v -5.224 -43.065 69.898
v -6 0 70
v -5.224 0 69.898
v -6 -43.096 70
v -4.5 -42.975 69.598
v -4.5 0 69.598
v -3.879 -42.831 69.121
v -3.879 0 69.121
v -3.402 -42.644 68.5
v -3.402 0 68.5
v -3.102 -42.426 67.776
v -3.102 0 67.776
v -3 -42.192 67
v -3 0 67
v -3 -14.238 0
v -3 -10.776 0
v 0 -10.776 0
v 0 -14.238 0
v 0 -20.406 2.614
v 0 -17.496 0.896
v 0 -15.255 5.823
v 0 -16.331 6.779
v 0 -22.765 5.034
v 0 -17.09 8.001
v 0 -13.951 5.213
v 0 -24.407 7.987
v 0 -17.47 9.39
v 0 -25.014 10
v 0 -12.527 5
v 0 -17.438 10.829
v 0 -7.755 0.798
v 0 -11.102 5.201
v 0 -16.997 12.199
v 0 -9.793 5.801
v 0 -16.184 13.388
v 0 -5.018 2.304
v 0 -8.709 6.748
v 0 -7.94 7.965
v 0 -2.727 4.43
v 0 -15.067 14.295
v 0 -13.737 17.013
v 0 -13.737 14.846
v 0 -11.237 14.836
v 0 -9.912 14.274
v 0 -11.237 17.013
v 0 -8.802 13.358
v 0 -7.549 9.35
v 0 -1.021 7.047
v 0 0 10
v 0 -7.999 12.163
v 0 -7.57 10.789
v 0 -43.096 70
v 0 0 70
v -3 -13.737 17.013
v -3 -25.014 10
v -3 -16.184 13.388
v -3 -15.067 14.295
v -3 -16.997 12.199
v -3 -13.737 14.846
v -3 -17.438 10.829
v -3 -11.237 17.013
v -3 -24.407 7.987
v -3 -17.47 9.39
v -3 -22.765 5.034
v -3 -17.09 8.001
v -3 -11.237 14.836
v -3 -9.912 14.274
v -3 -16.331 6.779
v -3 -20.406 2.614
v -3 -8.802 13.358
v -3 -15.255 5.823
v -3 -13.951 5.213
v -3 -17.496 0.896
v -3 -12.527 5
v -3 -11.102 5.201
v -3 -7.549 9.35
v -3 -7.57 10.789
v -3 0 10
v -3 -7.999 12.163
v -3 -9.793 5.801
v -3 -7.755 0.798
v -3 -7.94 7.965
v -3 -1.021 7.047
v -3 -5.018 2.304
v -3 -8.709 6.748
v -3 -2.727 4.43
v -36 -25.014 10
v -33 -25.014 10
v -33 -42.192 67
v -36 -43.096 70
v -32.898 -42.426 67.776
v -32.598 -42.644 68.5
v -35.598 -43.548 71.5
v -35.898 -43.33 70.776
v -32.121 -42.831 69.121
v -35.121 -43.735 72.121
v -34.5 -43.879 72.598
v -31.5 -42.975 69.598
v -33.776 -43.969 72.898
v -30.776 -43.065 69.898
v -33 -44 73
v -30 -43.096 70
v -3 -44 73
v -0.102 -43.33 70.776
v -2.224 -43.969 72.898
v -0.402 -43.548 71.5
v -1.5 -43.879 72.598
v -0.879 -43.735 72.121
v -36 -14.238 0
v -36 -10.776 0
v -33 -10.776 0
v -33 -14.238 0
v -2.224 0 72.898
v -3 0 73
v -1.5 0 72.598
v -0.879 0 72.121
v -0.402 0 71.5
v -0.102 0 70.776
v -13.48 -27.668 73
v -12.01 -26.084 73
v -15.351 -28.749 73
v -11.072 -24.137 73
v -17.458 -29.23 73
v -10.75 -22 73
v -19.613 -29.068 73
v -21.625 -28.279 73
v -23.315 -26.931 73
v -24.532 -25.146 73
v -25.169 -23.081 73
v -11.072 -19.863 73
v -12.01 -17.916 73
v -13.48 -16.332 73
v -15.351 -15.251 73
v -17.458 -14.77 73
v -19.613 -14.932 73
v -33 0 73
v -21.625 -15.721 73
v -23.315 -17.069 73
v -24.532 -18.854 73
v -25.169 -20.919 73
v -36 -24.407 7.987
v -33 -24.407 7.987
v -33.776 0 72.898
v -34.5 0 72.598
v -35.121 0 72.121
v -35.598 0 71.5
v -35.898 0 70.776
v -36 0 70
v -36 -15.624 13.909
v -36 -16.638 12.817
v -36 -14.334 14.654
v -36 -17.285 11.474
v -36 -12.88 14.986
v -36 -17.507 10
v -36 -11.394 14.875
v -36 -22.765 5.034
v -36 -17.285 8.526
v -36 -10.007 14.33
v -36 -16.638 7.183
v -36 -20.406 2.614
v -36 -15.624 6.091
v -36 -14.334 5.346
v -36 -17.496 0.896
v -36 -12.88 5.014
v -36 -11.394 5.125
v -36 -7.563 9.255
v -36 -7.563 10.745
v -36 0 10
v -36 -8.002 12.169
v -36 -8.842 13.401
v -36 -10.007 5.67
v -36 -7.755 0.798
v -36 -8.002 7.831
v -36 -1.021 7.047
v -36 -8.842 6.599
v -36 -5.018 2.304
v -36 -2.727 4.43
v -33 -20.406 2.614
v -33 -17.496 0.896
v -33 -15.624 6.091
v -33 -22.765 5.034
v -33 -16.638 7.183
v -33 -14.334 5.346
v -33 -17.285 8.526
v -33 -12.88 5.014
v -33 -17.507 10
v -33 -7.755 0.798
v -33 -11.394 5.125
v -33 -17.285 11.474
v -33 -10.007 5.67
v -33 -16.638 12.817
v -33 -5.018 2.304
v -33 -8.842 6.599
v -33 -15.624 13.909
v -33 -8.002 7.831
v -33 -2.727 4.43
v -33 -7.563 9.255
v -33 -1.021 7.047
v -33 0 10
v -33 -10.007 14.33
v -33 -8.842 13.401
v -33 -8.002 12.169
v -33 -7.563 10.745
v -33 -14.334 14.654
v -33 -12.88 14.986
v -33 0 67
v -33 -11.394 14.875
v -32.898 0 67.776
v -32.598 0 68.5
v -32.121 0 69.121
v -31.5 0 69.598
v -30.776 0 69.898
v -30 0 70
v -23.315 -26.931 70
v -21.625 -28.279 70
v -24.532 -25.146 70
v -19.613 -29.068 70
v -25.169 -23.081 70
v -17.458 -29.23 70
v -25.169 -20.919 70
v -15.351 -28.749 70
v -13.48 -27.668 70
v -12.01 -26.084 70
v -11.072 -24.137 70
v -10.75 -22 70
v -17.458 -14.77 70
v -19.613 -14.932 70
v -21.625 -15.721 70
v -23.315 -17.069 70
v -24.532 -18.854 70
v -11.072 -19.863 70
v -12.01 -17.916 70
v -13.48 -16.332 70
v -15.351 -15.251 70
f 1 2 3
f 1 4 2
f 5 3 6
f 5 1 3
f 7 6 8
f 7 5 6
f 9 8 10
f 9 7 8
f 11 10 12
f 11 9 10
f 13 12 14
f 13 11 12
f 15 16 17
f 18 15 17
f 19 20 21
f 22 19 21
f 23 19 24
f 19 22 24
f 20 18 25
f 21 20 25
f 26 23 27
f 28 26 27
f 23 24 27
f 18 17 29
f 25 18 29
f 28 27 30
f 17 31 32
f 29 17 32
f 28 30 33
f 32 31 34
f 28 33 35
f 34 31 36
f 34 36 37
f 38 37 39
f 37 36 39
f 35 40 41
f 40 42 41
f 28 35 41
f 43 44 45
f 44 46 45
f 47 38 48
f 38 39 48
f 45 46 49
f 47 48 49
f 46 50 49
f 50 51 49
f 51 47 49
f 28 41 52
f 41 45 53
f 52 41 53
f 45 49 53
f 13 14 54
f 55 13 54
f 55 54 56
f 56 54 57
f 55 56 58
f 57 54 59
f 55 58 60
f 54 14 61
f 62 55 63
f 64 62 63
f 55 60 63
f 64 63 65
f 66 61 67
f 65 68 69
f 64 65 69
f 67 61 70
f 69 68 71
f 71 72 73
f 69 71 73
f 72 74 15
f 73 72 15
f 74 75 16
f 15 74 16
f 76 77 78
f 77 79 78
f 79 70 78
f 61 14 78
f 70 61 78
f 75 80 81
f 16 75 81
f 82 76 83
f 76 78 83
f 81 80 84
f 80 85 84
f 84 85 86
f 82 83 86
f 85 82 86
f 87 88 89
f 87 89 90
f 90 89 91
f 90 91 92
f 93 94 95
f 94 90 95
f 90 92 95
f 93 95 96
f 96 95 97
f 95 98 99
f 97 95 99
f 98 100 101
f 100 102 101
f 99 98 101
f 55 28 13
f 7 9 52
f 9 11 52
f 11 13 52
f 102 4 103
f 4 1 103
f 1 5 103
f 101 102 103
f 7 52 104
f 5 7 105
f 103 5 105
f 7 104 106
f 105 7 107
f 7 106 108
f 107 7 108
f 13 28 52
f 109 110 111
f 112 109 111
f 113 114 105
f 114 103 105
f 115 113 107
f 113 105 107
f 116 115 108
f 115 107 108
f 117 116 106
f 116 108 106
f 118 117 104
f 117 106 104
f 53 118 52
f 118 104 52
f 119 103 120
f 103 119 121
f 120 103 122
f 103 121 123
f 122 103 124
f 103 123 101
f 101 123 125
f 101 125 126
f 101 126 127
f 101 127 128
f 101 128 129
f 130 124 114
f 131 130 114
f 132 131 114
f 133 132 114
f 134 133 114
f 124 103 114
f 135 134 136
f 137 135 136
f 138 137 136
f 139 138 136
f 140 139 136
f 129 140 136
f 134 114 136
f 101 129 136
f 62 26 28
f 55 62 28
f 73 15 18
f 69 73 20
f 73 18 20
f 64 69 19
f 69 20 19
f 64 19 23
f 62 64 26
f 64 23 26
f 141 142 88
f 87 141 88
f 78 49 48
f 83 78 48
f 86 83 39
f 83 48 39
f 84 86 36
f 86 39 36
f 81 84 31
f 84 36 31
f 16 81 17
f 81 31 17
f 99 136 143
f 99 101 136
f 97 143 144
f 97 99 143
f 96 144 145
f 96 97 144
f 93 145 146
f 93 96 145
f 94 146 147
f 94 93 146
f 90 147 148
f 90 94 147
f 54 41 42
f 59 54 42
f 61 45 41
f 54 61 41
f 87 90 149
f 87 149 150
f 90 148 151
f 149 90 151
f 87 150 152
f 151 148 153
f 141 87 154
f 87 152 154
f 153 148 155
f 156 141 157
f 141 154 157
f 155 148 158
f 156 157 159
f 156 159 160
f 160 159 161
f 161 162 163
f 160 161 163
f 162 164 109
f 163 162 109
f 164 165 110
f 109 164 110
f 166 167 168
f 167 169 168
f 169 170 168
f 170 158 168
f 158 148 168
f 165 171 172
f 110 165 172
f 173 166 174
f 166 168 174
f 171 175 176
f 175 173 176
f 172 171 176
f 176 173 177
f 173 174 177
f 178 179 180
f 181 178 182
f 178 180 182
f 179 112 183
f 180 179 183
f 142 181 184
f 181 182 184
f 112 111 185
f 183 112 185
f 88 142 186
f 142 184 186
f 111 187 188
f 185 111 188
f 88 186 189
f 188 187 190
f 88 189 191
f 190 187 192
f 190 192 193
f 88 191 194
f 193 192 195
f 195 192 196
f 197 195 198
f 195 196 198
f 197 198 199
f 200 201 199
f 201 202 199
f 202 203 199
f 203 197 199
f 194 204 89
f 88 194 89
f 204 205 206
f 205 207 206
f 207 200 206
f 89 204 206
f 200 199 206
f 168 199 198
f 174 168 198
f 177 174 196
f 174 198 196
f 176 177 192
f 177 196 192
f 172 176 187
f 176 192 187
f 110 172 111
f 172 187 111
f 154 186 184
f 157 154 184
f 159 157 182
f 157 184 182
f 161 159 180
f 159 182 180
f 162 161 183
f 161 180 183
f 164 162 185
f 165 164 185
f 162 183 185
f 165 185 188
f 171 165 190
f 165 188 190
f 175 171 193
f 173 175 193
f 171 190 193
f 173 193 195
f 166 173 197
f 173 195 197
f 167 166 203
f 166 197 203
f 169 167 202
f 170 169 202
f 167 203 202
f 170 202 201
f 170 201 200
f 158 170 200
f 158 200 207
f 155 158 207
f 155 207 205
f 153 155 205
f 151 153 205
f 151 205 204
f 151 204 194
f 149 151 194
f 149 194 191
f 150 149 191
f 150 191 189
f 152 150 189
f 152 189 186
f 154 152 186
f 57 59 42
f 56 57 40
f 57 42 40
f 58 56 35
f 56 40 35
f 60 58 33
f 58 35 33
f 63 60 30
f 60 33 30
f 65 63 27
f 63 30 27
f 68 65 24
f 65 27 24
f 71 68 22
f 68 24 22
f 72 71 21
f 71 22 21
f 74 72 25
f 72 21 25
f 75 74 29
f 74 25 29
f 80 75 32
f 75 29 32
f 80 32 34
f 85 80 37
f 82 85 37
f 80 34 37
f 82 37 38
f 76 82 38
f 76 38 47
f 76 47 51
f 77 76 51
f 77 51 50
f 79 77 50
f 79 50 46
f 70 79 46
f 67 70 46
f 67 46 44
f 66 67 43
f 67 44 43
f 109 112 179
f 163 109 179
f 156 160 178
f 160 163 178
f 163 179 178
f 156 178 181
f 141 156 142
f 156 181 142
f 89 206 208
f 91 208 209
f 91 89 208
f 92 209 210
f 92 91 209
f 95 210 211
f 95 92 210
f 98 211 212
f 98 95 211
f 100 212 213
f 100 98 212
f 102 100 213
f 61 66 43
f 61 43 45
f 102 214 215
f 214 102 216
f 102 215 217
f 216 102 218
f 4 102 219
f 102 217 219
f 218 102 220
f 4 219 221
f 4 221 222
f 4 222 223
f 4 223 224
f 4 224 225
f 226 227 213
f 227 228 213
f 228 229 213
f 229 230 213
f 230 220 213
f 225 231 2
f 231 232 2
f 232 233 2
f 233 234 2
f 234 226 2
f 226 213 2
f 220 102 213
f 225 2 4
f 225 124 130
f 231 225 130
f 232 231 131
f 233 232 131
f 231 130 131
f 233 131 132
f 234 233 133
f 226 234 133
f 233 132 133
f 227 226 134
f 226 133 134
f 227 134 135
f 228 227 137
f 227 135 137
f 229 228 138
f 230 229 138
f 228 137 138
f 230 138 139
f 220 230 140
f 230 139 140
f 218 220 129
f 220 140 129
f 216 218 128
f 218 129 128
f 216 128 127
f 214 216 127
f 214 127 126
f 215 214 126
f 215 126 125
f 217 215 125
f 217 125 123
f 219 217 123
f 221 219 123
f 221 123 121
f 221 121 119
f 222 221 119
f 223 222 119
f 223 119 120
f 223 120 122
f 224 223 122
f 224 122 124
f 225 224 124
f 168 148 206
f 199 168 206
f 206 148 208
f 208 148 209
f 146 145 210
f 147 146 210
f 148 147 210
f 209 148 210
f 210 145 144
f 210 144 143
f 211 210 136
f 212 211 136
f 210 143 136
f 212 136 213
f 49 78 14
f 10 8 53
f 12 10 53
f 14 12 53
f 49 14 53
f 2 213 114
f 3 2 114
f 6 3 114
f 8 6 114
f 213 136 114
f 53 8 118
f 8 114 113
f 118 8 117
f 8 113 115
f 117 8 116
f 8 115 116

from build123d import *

# Parameters (mm, degrees)
F1_DEPTH  = 44
F3_DEPTH  = 55.2
F5_DEPTH  = 63.6
F7_DEPTH  = 49.8
F9_DEPTH  = 25
F10_R     = 7.25
F11_DEPTH = 25
F12_R     = 3
F13_R     = 3
F14_R     = 3
F15_R     = 3


with BuildPart() as f1:
    # F0 (on Front) → F1 (new body)
    with BuildSketch(Plane.XZ):
        Polygon((-36, 0), (-33, 0), (-33, 70), (-3, 70), (-3, 0), (0, 0), (0, 73), (-36, 73), align=None)
    extrude(amount=F1_DEPTH)

    # F2 (on face) → F3 (cut)
    with BuildSketch(Plane.YZ):
        Polygon((-44, 73), (-44, 10), (-25.0136986301, 10), align=None)
        Polygon((-25.0136986301, 10), (-44, 10), (-44, 0), (-22, 0), align=None)
    extrude(amount=-F3_DEPTH, mode=Mode.SUBTRACT)

    # F4 (on face) → F5 (cut)
    with BuildSketch(Plane.YZ):
        with BuildLine():
            Line((-24.407023006, 7.9869399744), (-25.0136986301, 10))
            ThreePointArc((-25.0136986301, 10), (-24.7517991178, 8.9809817325), (-24.407023006, 7.9869399744))
        make_face()
        with BuildLine():
            Line((-22, 0), (-14.237880293, 0))
            ThreePointArc((-14.237880293, 0), (-20.4062314251, 2.6135784089), (-24.407023006, 7.9869399744))
            Line((-24.407023006, 7.9869399744), (-22, 0))
        make_face()
        with BuildLine():
            Line((0, 0), (0, 10))
            ThreePointArc((0, 10), (-3.807463773, 3.2969407526), (-10.7758183371, 0))
            Line((-10.7758183371, 0), (0, 0))
        make_face()
    extrude(amount=-F5_DEPTH, mode=Mode.SUBTRACT)

    # F4 (on face) + F6 (on face) → F7 (cut)
    with BuildSketch(Plane.YZ):
        with BuildLine():
            Line((-17.5068493151, 10), (-7.5068493151, 10))
            ThreePointArc((-7.5068493151, 10), (-12.5068493151, 15), (-17.5068493151, 10))
        make_face()
    with BuildSketch(Plane.YZ):
        with BuildLine():
            Line((-7.5068493151, 10), (-17.5068493151, 10))
            ThreePointArc((-17.5068493151, 10), (-12.5068493151, 5), (-7.5068493151, 10))
        make_face()
    extrude(amount=-F7_DEPTH, mode=Mode.SUBTRACT)

    # F8 (on face) → F9 (cut)
    with BuildSketch(Plane.YZ):
        with BuildLine():
            Line((-11.2372876331, 17.0134898722), (-13.7372876331, 17.0134898722))
            Line((-13.7372876331, 17.0134898722), (-13.7372876331, 14.8462378755))
            ThreePointArc((-13.7372876331, 14.8462378755), (-12.4866460858, 14.9999591828), (-11.2372876331, 14.8361361784))
            Line((-11.2372876331, 14.8361361784), (-11.2372876331, 17.0134898722))
        make_face()
        with BuildLine():
            ThreePointArc((-11.2372876331, 14.8361361784), (-12.4866460858, 14.9999591828), (-13.7372876331, 14.8462378755))
            Line((-13.7372876331, 14.8462378755), (-13.7372876331, 13.0134898722))
            Line((-13.7372876331, 13.0134898722), (-11.2372876331, 13.0134898722))
            Line((-11.2372876331, 13.0134898722), (-11.2372876331, 14.8361361784))
        make_face()
    extrude(amount=-F9_DEPTH, mode=Mode.SUBTRACT)

    # F10 (on face) → F11 (cut)
    with BuildSketch(Plane.XY.offset(73)):
        with Locations((-18, -22)):
            Circle(F10_R)
    extrude(amount=-F11_DEPTH, mode=Mode.SUBTRACT)

    # F12
    f12_edges = [f1.edges().sort_by_distance(p)[0] for p in [
        (0, -22, 73),
    ]]
    fillet(f12_edges, radius=F12_R)

    # F13
    f13_edges = [f1.edges().sort_by_distance(p)[0] for p in [
        (-36, -22, 73),
    ]]
    fillet(f13_edges, radius=F13_R)

    # F14
    f14_edges = [f1.edges().sort_by_distance(p)[0] for p in [
        (-33, -21.547945, 70),
    ]]
    fillet(f14_edges, radius=F14_R)

    # F15
    f15_edges = [f1.edges().sort_by_distance(p)[0] for p in [
        (-3, -21.547945, 70),
    ]]
    fillet(f15_edges, radius=F15_R)


solid = f1.part
